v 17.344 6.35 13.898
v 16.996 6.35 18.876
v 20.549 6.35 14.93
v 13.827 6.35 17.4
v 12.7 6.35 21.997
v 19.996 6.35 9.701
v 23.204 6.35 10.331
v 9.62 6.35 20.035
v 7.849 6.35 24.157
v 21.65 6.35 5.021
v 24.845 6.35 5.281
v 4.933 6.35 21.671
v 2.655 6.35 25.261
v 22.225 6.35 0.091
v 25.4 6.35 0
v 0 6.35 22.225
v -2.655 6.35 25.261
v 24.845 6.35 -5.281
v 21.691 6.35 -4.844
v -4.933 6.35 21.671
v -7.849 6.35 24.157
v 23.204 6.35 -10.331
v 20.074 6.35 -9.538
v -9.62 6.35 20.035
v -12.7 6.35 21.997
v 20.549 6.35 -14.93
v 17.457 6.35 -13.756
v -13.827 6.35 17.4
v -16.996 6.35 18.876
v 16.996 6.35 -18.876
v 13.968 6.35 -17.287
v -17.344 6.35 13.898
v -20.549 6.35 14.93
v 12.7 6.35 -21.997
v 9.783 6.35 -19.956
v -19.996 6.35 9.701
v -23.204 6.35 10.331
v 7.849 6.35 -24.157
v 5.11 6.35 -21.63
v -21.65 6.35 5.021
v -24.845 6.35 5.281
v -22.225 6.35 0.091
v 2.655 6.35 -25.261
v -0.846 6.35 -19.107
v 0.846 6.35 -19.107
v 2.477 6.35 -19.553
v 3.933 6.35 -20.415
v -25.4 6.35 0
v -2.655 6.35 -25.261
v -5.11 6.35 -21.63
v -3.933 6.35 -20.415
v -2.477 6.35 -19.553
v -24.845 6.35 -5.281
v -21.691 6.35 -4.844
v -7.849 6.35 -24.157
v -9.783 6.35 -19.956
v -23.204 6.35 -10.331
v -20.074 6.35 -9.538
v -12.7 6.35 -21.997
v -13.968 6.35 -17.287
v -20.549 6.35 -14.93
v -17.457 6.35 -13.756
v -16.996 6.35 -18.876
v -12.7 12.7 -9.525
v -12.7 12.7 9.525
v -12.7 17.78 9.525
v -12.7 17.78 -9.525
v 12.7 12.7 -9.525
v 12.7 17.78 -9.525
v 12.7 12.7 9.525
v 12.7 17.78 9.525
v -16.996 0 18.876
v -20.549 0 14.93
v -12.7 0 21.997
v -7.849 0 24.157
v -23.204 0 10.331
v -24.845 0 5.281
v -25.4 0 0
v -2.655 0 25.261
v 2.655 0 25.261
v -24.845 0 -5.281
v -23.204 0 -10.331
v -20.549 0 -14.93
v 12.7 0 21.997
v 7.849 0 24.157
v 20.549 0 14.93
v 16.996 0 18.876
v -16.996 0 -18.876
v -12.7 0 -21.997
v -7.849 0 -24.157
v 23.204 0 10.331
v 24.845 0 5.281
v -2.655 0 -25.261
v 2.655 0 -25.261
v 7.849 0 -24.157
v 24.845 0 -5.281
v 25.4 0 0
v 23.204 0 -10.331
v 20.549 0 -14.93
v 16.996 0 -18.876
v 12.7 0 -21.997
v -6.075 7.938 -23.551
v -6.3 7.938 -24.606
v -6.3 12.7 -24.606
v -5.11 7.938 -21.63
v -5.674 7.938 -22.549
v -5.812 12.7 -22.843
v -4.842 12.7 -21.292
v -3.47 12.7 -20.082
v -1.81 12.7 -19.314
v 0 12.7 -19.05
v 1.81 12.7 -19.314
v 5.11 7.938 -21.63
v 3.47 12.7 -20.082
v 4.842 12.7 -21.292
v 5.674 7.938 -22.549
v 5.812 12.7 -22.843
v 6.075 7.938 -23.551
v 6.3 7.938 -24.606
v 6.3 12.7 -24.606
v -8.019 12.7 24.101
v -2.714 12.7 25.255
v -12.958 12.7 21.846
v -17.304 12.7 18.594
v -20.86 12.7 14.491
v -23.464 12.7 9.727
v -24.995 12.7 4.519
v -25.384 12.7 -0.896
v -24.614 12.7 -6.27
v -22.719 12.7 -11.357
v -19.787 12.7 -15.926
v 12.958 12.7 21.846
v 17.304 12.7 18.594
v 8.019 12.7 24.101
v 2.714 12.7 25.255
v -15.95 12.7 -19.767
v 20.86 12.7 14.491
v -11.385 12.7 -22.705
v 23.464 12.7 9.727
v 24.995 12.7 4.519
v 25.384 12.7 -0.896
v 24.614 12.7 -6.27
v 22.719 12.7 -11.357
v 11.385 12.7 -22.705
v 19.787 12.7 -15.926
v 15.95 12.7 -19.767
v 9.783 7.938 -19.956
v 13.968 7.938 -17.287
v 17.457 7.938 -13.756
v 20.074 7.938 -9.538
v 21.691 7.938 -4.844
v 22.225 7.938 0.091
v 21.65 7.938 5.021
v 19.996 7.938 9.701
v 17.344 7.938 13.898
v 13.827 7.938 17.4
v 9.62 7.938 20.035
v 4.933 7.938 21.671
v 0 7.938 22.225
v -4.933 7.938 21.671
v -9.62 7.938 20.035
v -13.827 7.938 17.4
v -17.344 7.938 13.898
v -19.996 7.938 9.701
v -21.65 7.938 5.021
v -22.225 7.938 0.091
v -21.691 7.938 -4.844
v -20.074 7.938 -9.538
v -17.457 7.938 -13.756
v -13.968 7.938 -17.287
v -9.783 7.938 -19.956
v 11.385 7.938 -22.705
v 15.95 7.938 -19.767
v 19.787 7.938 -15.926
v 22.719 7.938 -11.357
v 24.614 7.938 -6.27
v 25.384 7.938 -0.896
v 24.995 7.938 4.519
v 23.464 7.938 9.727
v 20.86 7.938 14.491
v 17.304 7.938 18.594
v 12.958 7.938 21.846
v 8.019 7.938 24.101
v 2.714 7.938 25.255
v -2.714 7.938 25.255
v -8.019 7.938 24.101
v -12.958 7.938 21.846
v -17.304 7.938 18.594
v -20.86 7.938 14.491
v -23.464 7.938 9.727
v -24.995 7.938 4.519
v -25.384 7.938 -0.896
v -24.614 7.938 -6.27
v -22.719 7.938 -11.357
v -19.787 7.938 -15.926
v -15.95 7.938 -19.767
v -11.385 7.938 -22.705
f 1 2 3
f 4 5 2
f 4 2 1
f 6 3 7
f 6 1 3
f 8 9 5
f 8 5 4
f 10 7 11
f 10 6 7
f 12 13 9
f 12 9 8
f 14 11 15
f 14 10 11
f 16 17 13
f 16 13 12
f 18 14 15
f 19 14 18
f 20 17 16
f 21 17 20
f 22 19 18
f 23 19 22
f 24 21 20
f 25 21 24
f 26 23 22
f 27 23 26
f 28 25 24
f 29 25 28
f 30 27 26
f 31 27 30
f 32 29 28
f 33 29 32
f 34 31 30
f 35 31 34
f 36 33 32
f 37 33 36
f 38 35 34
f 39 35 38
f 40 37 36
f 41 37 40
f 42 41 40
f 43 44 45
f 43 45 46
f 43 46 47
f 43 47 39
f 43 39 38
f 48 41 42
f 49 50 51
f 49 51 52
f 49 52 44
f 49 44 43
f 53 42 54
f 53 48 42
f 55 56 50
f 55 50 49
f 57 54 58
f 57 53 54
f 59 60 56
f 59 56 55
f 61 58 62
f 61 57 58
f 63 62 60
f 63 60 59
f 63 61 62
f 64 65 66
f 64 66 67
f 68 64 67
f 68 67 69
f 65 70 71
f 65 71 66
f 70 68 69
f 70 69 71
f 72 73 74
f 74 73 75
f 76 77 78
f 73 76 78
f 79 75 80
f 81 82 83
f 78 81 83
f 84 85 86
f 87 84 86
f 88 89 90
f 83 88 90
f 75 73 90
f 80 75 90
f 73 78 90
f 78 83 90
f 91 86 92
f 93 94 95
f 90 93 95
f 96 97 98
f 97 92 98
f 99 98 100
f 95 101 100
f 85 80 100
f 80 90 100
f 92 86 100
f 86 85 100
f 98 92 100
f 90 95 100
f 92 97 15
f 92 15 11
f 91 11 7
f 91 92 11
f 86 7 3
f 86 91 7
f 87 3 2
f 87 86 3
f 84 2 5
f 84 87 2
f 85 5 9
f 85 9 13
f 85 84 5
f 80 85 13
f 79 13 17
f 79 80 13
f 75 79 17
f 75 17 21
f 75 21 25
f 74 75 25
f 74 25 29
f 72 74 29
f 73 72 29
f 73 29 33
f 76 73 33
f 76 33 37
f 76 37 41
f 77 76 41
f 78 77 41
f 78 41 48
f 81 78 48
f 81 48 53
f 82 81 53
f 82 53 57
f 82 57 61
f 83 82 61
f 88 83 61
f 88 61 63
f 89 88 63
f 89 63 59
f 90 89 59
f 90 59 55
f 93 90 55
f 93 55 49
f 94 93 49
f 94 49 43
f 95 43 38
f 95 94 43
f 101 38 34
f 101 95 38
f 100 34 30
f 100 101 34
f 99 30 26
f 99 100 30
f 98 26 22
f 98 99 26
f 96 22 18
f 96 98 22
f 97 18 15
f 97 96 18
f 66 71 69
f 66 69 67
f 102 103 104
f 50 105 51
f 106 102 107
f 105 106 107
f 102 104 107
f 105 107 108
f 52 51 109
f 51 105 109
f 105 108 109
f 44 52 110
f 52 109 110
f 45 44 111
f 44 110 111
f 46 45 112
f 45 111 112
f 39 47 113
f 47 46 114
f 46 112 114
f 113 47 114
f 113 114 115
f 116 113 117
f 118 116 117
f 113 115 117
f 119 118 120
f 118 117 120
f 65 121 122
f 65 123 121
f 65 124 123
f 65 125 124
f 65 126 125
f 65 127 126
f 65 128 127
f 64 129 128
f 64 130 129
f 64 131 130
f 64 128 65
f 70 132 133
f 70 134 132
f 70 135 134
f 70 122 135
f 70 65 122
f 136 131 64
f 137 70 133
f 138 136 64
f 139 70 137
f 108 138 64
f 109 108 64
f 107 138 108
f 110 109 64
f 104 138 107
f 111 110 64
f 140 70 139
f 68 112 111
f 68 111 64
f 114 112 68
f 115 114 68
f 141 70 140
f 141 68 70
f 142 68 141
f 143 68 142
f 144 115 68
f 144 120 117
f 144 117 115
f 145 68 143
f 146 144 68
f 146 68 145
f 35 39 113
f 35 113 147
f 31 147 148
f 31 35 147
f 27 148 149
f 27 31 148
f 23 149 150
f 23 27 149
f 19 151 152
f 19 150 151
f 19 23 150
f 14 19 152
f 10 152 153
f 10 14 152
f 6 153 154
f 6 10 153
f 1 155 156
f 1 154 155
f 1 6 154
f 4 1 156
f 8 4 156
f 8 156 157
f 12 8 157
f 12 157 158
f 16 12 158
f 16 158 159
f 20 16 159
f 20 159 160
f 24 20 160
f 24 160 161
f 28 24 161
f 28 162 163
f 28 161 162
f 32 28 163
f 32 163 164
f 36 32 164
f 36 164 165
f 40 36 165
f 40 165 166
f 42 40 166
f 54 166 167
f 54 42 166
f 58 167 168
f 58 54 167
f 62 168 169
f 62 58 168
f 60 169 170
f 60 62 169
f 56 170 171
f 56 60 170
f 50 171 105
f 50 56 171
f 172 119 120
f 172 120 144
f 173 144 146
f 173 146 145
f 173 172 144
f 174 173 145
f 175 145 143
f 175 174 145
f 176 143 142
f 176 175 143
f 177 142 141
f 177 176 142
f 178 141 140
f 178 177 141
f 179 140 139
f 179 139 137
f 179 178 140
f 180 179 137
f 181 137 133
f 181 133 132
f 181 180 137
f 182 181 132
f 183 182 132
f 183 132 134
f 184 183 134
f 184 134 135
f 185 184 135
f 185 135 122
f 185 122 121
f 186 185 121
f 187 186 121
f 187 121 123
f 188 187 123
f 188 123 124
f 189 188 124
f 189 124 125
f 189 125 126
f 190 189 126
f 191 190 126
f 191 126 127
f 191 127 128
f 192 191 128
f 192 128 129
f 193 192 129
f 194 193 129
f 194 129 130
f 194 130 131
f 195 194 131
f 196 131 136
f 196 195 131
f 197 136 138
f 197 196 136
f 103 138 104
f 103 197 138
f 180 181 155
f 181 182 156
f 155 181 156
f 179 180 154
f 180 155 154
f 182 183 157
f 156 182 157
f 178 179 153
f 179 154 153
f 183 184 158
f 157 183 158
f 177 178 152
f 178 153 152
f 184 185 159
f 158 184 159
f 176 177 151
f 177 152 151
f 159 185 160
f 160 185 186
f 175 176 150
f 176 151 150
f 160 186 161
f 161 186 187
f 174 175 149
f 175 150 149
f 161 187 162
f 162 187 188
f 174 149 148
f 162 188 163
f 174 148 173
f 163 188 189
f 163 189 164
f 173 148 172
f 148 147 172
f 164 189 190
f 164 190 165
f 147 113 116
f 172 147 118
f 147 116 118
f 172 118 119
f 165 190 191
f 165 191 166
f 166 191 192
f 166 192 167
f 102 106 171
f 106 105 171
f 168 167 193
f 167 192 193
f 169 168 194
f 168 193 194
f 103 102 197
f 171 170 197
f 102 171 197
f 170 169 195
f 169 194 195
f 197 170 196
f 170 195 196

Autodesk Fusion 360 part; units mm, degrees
sketch "Sketch1" plane through (0, 0, 0) normal (0, 1, 0) x (1, 0, 0)
  circle A0 centre (0, 0) radius 25.4
  dimension "d1" = 50.8
extrude "Extrude1" add sketch "Sketch1" along normal blind 12.7
sketch "Sketch2" plane through (0, 12.7, 0) normal (0, 1, 0) x (-1, 0, 0)
  circle A0 centre (0, 0) radius 25.4
  circle A1 centre (0, -25.4) radius 6.35
  dimension "d4" = 12.7
extrude "Extrude2" cut sketch "Sketch2" against normal blind 6.35 contours A0 A1 | A0 A1 picked at (-1.9477, -23.4128) picked at (2.1308, -27.1585)
sketch "Sketch3" plane through (0, 12.7, 0) normal (0, 1, 0) x (-1, 0, 0)
  arc A0 (6.3002, -24.6062) -> (-6.3002, -24.6062) centre (0, -25.4) ccw
  arc A1 (6.3002, -24.6063) -> (-6.3002, -24.6062) centre (0, 0) ccw
  circle A2 centre (0, -10.795) radius 4.7625
  circle A3 centre (0, -10.795) radius 2.5527
  dimension "d7" = 9.525
  dimension "d8" = 10.795
  dimension "d9" = 5.1054
sketch "Sketch4" plane through (0, 0, 0) normal (1, 0, 0) x (0, 0, -1)
  line L0 (25.4, 0) -> (25.4, 6.35)
  line L1 (-25.4, 12.7) -> (-25.4, 0)
  line L2 (19.05, 6.35) -> (24.6062, 6.35)
  line L3 (25.4, 6.35) -> (22.225, 6.35)
  line L4 (22.225, 7.9375) -> (25.4, 7.9375)
  line L5 (25.4, 7.9375) -> (25.4, 6.35)
  line L6 (22.225, 7.9375) -> (22.225, 6.35)
  dimension "d12" = 3.175
  dimension "d13" = 1.5875
revolve "Revolve1" cut sketch "Sketch4" angle 360 about axis through (0, 1.75, 0) along (0, 1, 0)
sketch "Sketch5" plane through (0, 12.7, 0) normal (0, 1, 0) x (-1, 0, 0)
  arc A0 (6.3002, -24.6062) -> (-6.3002, -24.6062) centre (0, -25.4) ccw
  arc A1 (6.3002, -24.6063) -> (-6.3002, -24.6062) centre (0, 0) ccw
  line L0 (0, -19.05) -> (0, 0) construction
  line L1 (0, 0) -> (0, 19.05) construction
  circle A2 centre (0, 25.4) radius 6.35
  arc A3 (5.1095, -21.6297) -> (-5.1095, -21.6297) centre (0, 0) ccw
  line L2 (-12.7, 9.525) -> (12.7, 9.525)
  line L3 (12.7, 9.525) -> (12.7, -9.525)
  line L4 (12.7, -9.525) -> (-12.7, -9.525)
  line L5 (-12.7, -9.525) -> (-12.7, 9.525)
  line L6 (-12.7, 9.525) -> (12.7, -9.525) construction
  line L7 (12.7, 9.525) -> (-12.7, -9.525) construction
  circle A4 centre (0, 0) radius 15.875
  dimension "d15" = 25.4
  dimension "d16" = 19.05
  dimension "d17" = 31.75
extrude "Extrude4" add sketch "Sketch5" along normal blind 5.08 contours L2 L3 L4 L5
equation "d17 = d15 + 0.25 in"
